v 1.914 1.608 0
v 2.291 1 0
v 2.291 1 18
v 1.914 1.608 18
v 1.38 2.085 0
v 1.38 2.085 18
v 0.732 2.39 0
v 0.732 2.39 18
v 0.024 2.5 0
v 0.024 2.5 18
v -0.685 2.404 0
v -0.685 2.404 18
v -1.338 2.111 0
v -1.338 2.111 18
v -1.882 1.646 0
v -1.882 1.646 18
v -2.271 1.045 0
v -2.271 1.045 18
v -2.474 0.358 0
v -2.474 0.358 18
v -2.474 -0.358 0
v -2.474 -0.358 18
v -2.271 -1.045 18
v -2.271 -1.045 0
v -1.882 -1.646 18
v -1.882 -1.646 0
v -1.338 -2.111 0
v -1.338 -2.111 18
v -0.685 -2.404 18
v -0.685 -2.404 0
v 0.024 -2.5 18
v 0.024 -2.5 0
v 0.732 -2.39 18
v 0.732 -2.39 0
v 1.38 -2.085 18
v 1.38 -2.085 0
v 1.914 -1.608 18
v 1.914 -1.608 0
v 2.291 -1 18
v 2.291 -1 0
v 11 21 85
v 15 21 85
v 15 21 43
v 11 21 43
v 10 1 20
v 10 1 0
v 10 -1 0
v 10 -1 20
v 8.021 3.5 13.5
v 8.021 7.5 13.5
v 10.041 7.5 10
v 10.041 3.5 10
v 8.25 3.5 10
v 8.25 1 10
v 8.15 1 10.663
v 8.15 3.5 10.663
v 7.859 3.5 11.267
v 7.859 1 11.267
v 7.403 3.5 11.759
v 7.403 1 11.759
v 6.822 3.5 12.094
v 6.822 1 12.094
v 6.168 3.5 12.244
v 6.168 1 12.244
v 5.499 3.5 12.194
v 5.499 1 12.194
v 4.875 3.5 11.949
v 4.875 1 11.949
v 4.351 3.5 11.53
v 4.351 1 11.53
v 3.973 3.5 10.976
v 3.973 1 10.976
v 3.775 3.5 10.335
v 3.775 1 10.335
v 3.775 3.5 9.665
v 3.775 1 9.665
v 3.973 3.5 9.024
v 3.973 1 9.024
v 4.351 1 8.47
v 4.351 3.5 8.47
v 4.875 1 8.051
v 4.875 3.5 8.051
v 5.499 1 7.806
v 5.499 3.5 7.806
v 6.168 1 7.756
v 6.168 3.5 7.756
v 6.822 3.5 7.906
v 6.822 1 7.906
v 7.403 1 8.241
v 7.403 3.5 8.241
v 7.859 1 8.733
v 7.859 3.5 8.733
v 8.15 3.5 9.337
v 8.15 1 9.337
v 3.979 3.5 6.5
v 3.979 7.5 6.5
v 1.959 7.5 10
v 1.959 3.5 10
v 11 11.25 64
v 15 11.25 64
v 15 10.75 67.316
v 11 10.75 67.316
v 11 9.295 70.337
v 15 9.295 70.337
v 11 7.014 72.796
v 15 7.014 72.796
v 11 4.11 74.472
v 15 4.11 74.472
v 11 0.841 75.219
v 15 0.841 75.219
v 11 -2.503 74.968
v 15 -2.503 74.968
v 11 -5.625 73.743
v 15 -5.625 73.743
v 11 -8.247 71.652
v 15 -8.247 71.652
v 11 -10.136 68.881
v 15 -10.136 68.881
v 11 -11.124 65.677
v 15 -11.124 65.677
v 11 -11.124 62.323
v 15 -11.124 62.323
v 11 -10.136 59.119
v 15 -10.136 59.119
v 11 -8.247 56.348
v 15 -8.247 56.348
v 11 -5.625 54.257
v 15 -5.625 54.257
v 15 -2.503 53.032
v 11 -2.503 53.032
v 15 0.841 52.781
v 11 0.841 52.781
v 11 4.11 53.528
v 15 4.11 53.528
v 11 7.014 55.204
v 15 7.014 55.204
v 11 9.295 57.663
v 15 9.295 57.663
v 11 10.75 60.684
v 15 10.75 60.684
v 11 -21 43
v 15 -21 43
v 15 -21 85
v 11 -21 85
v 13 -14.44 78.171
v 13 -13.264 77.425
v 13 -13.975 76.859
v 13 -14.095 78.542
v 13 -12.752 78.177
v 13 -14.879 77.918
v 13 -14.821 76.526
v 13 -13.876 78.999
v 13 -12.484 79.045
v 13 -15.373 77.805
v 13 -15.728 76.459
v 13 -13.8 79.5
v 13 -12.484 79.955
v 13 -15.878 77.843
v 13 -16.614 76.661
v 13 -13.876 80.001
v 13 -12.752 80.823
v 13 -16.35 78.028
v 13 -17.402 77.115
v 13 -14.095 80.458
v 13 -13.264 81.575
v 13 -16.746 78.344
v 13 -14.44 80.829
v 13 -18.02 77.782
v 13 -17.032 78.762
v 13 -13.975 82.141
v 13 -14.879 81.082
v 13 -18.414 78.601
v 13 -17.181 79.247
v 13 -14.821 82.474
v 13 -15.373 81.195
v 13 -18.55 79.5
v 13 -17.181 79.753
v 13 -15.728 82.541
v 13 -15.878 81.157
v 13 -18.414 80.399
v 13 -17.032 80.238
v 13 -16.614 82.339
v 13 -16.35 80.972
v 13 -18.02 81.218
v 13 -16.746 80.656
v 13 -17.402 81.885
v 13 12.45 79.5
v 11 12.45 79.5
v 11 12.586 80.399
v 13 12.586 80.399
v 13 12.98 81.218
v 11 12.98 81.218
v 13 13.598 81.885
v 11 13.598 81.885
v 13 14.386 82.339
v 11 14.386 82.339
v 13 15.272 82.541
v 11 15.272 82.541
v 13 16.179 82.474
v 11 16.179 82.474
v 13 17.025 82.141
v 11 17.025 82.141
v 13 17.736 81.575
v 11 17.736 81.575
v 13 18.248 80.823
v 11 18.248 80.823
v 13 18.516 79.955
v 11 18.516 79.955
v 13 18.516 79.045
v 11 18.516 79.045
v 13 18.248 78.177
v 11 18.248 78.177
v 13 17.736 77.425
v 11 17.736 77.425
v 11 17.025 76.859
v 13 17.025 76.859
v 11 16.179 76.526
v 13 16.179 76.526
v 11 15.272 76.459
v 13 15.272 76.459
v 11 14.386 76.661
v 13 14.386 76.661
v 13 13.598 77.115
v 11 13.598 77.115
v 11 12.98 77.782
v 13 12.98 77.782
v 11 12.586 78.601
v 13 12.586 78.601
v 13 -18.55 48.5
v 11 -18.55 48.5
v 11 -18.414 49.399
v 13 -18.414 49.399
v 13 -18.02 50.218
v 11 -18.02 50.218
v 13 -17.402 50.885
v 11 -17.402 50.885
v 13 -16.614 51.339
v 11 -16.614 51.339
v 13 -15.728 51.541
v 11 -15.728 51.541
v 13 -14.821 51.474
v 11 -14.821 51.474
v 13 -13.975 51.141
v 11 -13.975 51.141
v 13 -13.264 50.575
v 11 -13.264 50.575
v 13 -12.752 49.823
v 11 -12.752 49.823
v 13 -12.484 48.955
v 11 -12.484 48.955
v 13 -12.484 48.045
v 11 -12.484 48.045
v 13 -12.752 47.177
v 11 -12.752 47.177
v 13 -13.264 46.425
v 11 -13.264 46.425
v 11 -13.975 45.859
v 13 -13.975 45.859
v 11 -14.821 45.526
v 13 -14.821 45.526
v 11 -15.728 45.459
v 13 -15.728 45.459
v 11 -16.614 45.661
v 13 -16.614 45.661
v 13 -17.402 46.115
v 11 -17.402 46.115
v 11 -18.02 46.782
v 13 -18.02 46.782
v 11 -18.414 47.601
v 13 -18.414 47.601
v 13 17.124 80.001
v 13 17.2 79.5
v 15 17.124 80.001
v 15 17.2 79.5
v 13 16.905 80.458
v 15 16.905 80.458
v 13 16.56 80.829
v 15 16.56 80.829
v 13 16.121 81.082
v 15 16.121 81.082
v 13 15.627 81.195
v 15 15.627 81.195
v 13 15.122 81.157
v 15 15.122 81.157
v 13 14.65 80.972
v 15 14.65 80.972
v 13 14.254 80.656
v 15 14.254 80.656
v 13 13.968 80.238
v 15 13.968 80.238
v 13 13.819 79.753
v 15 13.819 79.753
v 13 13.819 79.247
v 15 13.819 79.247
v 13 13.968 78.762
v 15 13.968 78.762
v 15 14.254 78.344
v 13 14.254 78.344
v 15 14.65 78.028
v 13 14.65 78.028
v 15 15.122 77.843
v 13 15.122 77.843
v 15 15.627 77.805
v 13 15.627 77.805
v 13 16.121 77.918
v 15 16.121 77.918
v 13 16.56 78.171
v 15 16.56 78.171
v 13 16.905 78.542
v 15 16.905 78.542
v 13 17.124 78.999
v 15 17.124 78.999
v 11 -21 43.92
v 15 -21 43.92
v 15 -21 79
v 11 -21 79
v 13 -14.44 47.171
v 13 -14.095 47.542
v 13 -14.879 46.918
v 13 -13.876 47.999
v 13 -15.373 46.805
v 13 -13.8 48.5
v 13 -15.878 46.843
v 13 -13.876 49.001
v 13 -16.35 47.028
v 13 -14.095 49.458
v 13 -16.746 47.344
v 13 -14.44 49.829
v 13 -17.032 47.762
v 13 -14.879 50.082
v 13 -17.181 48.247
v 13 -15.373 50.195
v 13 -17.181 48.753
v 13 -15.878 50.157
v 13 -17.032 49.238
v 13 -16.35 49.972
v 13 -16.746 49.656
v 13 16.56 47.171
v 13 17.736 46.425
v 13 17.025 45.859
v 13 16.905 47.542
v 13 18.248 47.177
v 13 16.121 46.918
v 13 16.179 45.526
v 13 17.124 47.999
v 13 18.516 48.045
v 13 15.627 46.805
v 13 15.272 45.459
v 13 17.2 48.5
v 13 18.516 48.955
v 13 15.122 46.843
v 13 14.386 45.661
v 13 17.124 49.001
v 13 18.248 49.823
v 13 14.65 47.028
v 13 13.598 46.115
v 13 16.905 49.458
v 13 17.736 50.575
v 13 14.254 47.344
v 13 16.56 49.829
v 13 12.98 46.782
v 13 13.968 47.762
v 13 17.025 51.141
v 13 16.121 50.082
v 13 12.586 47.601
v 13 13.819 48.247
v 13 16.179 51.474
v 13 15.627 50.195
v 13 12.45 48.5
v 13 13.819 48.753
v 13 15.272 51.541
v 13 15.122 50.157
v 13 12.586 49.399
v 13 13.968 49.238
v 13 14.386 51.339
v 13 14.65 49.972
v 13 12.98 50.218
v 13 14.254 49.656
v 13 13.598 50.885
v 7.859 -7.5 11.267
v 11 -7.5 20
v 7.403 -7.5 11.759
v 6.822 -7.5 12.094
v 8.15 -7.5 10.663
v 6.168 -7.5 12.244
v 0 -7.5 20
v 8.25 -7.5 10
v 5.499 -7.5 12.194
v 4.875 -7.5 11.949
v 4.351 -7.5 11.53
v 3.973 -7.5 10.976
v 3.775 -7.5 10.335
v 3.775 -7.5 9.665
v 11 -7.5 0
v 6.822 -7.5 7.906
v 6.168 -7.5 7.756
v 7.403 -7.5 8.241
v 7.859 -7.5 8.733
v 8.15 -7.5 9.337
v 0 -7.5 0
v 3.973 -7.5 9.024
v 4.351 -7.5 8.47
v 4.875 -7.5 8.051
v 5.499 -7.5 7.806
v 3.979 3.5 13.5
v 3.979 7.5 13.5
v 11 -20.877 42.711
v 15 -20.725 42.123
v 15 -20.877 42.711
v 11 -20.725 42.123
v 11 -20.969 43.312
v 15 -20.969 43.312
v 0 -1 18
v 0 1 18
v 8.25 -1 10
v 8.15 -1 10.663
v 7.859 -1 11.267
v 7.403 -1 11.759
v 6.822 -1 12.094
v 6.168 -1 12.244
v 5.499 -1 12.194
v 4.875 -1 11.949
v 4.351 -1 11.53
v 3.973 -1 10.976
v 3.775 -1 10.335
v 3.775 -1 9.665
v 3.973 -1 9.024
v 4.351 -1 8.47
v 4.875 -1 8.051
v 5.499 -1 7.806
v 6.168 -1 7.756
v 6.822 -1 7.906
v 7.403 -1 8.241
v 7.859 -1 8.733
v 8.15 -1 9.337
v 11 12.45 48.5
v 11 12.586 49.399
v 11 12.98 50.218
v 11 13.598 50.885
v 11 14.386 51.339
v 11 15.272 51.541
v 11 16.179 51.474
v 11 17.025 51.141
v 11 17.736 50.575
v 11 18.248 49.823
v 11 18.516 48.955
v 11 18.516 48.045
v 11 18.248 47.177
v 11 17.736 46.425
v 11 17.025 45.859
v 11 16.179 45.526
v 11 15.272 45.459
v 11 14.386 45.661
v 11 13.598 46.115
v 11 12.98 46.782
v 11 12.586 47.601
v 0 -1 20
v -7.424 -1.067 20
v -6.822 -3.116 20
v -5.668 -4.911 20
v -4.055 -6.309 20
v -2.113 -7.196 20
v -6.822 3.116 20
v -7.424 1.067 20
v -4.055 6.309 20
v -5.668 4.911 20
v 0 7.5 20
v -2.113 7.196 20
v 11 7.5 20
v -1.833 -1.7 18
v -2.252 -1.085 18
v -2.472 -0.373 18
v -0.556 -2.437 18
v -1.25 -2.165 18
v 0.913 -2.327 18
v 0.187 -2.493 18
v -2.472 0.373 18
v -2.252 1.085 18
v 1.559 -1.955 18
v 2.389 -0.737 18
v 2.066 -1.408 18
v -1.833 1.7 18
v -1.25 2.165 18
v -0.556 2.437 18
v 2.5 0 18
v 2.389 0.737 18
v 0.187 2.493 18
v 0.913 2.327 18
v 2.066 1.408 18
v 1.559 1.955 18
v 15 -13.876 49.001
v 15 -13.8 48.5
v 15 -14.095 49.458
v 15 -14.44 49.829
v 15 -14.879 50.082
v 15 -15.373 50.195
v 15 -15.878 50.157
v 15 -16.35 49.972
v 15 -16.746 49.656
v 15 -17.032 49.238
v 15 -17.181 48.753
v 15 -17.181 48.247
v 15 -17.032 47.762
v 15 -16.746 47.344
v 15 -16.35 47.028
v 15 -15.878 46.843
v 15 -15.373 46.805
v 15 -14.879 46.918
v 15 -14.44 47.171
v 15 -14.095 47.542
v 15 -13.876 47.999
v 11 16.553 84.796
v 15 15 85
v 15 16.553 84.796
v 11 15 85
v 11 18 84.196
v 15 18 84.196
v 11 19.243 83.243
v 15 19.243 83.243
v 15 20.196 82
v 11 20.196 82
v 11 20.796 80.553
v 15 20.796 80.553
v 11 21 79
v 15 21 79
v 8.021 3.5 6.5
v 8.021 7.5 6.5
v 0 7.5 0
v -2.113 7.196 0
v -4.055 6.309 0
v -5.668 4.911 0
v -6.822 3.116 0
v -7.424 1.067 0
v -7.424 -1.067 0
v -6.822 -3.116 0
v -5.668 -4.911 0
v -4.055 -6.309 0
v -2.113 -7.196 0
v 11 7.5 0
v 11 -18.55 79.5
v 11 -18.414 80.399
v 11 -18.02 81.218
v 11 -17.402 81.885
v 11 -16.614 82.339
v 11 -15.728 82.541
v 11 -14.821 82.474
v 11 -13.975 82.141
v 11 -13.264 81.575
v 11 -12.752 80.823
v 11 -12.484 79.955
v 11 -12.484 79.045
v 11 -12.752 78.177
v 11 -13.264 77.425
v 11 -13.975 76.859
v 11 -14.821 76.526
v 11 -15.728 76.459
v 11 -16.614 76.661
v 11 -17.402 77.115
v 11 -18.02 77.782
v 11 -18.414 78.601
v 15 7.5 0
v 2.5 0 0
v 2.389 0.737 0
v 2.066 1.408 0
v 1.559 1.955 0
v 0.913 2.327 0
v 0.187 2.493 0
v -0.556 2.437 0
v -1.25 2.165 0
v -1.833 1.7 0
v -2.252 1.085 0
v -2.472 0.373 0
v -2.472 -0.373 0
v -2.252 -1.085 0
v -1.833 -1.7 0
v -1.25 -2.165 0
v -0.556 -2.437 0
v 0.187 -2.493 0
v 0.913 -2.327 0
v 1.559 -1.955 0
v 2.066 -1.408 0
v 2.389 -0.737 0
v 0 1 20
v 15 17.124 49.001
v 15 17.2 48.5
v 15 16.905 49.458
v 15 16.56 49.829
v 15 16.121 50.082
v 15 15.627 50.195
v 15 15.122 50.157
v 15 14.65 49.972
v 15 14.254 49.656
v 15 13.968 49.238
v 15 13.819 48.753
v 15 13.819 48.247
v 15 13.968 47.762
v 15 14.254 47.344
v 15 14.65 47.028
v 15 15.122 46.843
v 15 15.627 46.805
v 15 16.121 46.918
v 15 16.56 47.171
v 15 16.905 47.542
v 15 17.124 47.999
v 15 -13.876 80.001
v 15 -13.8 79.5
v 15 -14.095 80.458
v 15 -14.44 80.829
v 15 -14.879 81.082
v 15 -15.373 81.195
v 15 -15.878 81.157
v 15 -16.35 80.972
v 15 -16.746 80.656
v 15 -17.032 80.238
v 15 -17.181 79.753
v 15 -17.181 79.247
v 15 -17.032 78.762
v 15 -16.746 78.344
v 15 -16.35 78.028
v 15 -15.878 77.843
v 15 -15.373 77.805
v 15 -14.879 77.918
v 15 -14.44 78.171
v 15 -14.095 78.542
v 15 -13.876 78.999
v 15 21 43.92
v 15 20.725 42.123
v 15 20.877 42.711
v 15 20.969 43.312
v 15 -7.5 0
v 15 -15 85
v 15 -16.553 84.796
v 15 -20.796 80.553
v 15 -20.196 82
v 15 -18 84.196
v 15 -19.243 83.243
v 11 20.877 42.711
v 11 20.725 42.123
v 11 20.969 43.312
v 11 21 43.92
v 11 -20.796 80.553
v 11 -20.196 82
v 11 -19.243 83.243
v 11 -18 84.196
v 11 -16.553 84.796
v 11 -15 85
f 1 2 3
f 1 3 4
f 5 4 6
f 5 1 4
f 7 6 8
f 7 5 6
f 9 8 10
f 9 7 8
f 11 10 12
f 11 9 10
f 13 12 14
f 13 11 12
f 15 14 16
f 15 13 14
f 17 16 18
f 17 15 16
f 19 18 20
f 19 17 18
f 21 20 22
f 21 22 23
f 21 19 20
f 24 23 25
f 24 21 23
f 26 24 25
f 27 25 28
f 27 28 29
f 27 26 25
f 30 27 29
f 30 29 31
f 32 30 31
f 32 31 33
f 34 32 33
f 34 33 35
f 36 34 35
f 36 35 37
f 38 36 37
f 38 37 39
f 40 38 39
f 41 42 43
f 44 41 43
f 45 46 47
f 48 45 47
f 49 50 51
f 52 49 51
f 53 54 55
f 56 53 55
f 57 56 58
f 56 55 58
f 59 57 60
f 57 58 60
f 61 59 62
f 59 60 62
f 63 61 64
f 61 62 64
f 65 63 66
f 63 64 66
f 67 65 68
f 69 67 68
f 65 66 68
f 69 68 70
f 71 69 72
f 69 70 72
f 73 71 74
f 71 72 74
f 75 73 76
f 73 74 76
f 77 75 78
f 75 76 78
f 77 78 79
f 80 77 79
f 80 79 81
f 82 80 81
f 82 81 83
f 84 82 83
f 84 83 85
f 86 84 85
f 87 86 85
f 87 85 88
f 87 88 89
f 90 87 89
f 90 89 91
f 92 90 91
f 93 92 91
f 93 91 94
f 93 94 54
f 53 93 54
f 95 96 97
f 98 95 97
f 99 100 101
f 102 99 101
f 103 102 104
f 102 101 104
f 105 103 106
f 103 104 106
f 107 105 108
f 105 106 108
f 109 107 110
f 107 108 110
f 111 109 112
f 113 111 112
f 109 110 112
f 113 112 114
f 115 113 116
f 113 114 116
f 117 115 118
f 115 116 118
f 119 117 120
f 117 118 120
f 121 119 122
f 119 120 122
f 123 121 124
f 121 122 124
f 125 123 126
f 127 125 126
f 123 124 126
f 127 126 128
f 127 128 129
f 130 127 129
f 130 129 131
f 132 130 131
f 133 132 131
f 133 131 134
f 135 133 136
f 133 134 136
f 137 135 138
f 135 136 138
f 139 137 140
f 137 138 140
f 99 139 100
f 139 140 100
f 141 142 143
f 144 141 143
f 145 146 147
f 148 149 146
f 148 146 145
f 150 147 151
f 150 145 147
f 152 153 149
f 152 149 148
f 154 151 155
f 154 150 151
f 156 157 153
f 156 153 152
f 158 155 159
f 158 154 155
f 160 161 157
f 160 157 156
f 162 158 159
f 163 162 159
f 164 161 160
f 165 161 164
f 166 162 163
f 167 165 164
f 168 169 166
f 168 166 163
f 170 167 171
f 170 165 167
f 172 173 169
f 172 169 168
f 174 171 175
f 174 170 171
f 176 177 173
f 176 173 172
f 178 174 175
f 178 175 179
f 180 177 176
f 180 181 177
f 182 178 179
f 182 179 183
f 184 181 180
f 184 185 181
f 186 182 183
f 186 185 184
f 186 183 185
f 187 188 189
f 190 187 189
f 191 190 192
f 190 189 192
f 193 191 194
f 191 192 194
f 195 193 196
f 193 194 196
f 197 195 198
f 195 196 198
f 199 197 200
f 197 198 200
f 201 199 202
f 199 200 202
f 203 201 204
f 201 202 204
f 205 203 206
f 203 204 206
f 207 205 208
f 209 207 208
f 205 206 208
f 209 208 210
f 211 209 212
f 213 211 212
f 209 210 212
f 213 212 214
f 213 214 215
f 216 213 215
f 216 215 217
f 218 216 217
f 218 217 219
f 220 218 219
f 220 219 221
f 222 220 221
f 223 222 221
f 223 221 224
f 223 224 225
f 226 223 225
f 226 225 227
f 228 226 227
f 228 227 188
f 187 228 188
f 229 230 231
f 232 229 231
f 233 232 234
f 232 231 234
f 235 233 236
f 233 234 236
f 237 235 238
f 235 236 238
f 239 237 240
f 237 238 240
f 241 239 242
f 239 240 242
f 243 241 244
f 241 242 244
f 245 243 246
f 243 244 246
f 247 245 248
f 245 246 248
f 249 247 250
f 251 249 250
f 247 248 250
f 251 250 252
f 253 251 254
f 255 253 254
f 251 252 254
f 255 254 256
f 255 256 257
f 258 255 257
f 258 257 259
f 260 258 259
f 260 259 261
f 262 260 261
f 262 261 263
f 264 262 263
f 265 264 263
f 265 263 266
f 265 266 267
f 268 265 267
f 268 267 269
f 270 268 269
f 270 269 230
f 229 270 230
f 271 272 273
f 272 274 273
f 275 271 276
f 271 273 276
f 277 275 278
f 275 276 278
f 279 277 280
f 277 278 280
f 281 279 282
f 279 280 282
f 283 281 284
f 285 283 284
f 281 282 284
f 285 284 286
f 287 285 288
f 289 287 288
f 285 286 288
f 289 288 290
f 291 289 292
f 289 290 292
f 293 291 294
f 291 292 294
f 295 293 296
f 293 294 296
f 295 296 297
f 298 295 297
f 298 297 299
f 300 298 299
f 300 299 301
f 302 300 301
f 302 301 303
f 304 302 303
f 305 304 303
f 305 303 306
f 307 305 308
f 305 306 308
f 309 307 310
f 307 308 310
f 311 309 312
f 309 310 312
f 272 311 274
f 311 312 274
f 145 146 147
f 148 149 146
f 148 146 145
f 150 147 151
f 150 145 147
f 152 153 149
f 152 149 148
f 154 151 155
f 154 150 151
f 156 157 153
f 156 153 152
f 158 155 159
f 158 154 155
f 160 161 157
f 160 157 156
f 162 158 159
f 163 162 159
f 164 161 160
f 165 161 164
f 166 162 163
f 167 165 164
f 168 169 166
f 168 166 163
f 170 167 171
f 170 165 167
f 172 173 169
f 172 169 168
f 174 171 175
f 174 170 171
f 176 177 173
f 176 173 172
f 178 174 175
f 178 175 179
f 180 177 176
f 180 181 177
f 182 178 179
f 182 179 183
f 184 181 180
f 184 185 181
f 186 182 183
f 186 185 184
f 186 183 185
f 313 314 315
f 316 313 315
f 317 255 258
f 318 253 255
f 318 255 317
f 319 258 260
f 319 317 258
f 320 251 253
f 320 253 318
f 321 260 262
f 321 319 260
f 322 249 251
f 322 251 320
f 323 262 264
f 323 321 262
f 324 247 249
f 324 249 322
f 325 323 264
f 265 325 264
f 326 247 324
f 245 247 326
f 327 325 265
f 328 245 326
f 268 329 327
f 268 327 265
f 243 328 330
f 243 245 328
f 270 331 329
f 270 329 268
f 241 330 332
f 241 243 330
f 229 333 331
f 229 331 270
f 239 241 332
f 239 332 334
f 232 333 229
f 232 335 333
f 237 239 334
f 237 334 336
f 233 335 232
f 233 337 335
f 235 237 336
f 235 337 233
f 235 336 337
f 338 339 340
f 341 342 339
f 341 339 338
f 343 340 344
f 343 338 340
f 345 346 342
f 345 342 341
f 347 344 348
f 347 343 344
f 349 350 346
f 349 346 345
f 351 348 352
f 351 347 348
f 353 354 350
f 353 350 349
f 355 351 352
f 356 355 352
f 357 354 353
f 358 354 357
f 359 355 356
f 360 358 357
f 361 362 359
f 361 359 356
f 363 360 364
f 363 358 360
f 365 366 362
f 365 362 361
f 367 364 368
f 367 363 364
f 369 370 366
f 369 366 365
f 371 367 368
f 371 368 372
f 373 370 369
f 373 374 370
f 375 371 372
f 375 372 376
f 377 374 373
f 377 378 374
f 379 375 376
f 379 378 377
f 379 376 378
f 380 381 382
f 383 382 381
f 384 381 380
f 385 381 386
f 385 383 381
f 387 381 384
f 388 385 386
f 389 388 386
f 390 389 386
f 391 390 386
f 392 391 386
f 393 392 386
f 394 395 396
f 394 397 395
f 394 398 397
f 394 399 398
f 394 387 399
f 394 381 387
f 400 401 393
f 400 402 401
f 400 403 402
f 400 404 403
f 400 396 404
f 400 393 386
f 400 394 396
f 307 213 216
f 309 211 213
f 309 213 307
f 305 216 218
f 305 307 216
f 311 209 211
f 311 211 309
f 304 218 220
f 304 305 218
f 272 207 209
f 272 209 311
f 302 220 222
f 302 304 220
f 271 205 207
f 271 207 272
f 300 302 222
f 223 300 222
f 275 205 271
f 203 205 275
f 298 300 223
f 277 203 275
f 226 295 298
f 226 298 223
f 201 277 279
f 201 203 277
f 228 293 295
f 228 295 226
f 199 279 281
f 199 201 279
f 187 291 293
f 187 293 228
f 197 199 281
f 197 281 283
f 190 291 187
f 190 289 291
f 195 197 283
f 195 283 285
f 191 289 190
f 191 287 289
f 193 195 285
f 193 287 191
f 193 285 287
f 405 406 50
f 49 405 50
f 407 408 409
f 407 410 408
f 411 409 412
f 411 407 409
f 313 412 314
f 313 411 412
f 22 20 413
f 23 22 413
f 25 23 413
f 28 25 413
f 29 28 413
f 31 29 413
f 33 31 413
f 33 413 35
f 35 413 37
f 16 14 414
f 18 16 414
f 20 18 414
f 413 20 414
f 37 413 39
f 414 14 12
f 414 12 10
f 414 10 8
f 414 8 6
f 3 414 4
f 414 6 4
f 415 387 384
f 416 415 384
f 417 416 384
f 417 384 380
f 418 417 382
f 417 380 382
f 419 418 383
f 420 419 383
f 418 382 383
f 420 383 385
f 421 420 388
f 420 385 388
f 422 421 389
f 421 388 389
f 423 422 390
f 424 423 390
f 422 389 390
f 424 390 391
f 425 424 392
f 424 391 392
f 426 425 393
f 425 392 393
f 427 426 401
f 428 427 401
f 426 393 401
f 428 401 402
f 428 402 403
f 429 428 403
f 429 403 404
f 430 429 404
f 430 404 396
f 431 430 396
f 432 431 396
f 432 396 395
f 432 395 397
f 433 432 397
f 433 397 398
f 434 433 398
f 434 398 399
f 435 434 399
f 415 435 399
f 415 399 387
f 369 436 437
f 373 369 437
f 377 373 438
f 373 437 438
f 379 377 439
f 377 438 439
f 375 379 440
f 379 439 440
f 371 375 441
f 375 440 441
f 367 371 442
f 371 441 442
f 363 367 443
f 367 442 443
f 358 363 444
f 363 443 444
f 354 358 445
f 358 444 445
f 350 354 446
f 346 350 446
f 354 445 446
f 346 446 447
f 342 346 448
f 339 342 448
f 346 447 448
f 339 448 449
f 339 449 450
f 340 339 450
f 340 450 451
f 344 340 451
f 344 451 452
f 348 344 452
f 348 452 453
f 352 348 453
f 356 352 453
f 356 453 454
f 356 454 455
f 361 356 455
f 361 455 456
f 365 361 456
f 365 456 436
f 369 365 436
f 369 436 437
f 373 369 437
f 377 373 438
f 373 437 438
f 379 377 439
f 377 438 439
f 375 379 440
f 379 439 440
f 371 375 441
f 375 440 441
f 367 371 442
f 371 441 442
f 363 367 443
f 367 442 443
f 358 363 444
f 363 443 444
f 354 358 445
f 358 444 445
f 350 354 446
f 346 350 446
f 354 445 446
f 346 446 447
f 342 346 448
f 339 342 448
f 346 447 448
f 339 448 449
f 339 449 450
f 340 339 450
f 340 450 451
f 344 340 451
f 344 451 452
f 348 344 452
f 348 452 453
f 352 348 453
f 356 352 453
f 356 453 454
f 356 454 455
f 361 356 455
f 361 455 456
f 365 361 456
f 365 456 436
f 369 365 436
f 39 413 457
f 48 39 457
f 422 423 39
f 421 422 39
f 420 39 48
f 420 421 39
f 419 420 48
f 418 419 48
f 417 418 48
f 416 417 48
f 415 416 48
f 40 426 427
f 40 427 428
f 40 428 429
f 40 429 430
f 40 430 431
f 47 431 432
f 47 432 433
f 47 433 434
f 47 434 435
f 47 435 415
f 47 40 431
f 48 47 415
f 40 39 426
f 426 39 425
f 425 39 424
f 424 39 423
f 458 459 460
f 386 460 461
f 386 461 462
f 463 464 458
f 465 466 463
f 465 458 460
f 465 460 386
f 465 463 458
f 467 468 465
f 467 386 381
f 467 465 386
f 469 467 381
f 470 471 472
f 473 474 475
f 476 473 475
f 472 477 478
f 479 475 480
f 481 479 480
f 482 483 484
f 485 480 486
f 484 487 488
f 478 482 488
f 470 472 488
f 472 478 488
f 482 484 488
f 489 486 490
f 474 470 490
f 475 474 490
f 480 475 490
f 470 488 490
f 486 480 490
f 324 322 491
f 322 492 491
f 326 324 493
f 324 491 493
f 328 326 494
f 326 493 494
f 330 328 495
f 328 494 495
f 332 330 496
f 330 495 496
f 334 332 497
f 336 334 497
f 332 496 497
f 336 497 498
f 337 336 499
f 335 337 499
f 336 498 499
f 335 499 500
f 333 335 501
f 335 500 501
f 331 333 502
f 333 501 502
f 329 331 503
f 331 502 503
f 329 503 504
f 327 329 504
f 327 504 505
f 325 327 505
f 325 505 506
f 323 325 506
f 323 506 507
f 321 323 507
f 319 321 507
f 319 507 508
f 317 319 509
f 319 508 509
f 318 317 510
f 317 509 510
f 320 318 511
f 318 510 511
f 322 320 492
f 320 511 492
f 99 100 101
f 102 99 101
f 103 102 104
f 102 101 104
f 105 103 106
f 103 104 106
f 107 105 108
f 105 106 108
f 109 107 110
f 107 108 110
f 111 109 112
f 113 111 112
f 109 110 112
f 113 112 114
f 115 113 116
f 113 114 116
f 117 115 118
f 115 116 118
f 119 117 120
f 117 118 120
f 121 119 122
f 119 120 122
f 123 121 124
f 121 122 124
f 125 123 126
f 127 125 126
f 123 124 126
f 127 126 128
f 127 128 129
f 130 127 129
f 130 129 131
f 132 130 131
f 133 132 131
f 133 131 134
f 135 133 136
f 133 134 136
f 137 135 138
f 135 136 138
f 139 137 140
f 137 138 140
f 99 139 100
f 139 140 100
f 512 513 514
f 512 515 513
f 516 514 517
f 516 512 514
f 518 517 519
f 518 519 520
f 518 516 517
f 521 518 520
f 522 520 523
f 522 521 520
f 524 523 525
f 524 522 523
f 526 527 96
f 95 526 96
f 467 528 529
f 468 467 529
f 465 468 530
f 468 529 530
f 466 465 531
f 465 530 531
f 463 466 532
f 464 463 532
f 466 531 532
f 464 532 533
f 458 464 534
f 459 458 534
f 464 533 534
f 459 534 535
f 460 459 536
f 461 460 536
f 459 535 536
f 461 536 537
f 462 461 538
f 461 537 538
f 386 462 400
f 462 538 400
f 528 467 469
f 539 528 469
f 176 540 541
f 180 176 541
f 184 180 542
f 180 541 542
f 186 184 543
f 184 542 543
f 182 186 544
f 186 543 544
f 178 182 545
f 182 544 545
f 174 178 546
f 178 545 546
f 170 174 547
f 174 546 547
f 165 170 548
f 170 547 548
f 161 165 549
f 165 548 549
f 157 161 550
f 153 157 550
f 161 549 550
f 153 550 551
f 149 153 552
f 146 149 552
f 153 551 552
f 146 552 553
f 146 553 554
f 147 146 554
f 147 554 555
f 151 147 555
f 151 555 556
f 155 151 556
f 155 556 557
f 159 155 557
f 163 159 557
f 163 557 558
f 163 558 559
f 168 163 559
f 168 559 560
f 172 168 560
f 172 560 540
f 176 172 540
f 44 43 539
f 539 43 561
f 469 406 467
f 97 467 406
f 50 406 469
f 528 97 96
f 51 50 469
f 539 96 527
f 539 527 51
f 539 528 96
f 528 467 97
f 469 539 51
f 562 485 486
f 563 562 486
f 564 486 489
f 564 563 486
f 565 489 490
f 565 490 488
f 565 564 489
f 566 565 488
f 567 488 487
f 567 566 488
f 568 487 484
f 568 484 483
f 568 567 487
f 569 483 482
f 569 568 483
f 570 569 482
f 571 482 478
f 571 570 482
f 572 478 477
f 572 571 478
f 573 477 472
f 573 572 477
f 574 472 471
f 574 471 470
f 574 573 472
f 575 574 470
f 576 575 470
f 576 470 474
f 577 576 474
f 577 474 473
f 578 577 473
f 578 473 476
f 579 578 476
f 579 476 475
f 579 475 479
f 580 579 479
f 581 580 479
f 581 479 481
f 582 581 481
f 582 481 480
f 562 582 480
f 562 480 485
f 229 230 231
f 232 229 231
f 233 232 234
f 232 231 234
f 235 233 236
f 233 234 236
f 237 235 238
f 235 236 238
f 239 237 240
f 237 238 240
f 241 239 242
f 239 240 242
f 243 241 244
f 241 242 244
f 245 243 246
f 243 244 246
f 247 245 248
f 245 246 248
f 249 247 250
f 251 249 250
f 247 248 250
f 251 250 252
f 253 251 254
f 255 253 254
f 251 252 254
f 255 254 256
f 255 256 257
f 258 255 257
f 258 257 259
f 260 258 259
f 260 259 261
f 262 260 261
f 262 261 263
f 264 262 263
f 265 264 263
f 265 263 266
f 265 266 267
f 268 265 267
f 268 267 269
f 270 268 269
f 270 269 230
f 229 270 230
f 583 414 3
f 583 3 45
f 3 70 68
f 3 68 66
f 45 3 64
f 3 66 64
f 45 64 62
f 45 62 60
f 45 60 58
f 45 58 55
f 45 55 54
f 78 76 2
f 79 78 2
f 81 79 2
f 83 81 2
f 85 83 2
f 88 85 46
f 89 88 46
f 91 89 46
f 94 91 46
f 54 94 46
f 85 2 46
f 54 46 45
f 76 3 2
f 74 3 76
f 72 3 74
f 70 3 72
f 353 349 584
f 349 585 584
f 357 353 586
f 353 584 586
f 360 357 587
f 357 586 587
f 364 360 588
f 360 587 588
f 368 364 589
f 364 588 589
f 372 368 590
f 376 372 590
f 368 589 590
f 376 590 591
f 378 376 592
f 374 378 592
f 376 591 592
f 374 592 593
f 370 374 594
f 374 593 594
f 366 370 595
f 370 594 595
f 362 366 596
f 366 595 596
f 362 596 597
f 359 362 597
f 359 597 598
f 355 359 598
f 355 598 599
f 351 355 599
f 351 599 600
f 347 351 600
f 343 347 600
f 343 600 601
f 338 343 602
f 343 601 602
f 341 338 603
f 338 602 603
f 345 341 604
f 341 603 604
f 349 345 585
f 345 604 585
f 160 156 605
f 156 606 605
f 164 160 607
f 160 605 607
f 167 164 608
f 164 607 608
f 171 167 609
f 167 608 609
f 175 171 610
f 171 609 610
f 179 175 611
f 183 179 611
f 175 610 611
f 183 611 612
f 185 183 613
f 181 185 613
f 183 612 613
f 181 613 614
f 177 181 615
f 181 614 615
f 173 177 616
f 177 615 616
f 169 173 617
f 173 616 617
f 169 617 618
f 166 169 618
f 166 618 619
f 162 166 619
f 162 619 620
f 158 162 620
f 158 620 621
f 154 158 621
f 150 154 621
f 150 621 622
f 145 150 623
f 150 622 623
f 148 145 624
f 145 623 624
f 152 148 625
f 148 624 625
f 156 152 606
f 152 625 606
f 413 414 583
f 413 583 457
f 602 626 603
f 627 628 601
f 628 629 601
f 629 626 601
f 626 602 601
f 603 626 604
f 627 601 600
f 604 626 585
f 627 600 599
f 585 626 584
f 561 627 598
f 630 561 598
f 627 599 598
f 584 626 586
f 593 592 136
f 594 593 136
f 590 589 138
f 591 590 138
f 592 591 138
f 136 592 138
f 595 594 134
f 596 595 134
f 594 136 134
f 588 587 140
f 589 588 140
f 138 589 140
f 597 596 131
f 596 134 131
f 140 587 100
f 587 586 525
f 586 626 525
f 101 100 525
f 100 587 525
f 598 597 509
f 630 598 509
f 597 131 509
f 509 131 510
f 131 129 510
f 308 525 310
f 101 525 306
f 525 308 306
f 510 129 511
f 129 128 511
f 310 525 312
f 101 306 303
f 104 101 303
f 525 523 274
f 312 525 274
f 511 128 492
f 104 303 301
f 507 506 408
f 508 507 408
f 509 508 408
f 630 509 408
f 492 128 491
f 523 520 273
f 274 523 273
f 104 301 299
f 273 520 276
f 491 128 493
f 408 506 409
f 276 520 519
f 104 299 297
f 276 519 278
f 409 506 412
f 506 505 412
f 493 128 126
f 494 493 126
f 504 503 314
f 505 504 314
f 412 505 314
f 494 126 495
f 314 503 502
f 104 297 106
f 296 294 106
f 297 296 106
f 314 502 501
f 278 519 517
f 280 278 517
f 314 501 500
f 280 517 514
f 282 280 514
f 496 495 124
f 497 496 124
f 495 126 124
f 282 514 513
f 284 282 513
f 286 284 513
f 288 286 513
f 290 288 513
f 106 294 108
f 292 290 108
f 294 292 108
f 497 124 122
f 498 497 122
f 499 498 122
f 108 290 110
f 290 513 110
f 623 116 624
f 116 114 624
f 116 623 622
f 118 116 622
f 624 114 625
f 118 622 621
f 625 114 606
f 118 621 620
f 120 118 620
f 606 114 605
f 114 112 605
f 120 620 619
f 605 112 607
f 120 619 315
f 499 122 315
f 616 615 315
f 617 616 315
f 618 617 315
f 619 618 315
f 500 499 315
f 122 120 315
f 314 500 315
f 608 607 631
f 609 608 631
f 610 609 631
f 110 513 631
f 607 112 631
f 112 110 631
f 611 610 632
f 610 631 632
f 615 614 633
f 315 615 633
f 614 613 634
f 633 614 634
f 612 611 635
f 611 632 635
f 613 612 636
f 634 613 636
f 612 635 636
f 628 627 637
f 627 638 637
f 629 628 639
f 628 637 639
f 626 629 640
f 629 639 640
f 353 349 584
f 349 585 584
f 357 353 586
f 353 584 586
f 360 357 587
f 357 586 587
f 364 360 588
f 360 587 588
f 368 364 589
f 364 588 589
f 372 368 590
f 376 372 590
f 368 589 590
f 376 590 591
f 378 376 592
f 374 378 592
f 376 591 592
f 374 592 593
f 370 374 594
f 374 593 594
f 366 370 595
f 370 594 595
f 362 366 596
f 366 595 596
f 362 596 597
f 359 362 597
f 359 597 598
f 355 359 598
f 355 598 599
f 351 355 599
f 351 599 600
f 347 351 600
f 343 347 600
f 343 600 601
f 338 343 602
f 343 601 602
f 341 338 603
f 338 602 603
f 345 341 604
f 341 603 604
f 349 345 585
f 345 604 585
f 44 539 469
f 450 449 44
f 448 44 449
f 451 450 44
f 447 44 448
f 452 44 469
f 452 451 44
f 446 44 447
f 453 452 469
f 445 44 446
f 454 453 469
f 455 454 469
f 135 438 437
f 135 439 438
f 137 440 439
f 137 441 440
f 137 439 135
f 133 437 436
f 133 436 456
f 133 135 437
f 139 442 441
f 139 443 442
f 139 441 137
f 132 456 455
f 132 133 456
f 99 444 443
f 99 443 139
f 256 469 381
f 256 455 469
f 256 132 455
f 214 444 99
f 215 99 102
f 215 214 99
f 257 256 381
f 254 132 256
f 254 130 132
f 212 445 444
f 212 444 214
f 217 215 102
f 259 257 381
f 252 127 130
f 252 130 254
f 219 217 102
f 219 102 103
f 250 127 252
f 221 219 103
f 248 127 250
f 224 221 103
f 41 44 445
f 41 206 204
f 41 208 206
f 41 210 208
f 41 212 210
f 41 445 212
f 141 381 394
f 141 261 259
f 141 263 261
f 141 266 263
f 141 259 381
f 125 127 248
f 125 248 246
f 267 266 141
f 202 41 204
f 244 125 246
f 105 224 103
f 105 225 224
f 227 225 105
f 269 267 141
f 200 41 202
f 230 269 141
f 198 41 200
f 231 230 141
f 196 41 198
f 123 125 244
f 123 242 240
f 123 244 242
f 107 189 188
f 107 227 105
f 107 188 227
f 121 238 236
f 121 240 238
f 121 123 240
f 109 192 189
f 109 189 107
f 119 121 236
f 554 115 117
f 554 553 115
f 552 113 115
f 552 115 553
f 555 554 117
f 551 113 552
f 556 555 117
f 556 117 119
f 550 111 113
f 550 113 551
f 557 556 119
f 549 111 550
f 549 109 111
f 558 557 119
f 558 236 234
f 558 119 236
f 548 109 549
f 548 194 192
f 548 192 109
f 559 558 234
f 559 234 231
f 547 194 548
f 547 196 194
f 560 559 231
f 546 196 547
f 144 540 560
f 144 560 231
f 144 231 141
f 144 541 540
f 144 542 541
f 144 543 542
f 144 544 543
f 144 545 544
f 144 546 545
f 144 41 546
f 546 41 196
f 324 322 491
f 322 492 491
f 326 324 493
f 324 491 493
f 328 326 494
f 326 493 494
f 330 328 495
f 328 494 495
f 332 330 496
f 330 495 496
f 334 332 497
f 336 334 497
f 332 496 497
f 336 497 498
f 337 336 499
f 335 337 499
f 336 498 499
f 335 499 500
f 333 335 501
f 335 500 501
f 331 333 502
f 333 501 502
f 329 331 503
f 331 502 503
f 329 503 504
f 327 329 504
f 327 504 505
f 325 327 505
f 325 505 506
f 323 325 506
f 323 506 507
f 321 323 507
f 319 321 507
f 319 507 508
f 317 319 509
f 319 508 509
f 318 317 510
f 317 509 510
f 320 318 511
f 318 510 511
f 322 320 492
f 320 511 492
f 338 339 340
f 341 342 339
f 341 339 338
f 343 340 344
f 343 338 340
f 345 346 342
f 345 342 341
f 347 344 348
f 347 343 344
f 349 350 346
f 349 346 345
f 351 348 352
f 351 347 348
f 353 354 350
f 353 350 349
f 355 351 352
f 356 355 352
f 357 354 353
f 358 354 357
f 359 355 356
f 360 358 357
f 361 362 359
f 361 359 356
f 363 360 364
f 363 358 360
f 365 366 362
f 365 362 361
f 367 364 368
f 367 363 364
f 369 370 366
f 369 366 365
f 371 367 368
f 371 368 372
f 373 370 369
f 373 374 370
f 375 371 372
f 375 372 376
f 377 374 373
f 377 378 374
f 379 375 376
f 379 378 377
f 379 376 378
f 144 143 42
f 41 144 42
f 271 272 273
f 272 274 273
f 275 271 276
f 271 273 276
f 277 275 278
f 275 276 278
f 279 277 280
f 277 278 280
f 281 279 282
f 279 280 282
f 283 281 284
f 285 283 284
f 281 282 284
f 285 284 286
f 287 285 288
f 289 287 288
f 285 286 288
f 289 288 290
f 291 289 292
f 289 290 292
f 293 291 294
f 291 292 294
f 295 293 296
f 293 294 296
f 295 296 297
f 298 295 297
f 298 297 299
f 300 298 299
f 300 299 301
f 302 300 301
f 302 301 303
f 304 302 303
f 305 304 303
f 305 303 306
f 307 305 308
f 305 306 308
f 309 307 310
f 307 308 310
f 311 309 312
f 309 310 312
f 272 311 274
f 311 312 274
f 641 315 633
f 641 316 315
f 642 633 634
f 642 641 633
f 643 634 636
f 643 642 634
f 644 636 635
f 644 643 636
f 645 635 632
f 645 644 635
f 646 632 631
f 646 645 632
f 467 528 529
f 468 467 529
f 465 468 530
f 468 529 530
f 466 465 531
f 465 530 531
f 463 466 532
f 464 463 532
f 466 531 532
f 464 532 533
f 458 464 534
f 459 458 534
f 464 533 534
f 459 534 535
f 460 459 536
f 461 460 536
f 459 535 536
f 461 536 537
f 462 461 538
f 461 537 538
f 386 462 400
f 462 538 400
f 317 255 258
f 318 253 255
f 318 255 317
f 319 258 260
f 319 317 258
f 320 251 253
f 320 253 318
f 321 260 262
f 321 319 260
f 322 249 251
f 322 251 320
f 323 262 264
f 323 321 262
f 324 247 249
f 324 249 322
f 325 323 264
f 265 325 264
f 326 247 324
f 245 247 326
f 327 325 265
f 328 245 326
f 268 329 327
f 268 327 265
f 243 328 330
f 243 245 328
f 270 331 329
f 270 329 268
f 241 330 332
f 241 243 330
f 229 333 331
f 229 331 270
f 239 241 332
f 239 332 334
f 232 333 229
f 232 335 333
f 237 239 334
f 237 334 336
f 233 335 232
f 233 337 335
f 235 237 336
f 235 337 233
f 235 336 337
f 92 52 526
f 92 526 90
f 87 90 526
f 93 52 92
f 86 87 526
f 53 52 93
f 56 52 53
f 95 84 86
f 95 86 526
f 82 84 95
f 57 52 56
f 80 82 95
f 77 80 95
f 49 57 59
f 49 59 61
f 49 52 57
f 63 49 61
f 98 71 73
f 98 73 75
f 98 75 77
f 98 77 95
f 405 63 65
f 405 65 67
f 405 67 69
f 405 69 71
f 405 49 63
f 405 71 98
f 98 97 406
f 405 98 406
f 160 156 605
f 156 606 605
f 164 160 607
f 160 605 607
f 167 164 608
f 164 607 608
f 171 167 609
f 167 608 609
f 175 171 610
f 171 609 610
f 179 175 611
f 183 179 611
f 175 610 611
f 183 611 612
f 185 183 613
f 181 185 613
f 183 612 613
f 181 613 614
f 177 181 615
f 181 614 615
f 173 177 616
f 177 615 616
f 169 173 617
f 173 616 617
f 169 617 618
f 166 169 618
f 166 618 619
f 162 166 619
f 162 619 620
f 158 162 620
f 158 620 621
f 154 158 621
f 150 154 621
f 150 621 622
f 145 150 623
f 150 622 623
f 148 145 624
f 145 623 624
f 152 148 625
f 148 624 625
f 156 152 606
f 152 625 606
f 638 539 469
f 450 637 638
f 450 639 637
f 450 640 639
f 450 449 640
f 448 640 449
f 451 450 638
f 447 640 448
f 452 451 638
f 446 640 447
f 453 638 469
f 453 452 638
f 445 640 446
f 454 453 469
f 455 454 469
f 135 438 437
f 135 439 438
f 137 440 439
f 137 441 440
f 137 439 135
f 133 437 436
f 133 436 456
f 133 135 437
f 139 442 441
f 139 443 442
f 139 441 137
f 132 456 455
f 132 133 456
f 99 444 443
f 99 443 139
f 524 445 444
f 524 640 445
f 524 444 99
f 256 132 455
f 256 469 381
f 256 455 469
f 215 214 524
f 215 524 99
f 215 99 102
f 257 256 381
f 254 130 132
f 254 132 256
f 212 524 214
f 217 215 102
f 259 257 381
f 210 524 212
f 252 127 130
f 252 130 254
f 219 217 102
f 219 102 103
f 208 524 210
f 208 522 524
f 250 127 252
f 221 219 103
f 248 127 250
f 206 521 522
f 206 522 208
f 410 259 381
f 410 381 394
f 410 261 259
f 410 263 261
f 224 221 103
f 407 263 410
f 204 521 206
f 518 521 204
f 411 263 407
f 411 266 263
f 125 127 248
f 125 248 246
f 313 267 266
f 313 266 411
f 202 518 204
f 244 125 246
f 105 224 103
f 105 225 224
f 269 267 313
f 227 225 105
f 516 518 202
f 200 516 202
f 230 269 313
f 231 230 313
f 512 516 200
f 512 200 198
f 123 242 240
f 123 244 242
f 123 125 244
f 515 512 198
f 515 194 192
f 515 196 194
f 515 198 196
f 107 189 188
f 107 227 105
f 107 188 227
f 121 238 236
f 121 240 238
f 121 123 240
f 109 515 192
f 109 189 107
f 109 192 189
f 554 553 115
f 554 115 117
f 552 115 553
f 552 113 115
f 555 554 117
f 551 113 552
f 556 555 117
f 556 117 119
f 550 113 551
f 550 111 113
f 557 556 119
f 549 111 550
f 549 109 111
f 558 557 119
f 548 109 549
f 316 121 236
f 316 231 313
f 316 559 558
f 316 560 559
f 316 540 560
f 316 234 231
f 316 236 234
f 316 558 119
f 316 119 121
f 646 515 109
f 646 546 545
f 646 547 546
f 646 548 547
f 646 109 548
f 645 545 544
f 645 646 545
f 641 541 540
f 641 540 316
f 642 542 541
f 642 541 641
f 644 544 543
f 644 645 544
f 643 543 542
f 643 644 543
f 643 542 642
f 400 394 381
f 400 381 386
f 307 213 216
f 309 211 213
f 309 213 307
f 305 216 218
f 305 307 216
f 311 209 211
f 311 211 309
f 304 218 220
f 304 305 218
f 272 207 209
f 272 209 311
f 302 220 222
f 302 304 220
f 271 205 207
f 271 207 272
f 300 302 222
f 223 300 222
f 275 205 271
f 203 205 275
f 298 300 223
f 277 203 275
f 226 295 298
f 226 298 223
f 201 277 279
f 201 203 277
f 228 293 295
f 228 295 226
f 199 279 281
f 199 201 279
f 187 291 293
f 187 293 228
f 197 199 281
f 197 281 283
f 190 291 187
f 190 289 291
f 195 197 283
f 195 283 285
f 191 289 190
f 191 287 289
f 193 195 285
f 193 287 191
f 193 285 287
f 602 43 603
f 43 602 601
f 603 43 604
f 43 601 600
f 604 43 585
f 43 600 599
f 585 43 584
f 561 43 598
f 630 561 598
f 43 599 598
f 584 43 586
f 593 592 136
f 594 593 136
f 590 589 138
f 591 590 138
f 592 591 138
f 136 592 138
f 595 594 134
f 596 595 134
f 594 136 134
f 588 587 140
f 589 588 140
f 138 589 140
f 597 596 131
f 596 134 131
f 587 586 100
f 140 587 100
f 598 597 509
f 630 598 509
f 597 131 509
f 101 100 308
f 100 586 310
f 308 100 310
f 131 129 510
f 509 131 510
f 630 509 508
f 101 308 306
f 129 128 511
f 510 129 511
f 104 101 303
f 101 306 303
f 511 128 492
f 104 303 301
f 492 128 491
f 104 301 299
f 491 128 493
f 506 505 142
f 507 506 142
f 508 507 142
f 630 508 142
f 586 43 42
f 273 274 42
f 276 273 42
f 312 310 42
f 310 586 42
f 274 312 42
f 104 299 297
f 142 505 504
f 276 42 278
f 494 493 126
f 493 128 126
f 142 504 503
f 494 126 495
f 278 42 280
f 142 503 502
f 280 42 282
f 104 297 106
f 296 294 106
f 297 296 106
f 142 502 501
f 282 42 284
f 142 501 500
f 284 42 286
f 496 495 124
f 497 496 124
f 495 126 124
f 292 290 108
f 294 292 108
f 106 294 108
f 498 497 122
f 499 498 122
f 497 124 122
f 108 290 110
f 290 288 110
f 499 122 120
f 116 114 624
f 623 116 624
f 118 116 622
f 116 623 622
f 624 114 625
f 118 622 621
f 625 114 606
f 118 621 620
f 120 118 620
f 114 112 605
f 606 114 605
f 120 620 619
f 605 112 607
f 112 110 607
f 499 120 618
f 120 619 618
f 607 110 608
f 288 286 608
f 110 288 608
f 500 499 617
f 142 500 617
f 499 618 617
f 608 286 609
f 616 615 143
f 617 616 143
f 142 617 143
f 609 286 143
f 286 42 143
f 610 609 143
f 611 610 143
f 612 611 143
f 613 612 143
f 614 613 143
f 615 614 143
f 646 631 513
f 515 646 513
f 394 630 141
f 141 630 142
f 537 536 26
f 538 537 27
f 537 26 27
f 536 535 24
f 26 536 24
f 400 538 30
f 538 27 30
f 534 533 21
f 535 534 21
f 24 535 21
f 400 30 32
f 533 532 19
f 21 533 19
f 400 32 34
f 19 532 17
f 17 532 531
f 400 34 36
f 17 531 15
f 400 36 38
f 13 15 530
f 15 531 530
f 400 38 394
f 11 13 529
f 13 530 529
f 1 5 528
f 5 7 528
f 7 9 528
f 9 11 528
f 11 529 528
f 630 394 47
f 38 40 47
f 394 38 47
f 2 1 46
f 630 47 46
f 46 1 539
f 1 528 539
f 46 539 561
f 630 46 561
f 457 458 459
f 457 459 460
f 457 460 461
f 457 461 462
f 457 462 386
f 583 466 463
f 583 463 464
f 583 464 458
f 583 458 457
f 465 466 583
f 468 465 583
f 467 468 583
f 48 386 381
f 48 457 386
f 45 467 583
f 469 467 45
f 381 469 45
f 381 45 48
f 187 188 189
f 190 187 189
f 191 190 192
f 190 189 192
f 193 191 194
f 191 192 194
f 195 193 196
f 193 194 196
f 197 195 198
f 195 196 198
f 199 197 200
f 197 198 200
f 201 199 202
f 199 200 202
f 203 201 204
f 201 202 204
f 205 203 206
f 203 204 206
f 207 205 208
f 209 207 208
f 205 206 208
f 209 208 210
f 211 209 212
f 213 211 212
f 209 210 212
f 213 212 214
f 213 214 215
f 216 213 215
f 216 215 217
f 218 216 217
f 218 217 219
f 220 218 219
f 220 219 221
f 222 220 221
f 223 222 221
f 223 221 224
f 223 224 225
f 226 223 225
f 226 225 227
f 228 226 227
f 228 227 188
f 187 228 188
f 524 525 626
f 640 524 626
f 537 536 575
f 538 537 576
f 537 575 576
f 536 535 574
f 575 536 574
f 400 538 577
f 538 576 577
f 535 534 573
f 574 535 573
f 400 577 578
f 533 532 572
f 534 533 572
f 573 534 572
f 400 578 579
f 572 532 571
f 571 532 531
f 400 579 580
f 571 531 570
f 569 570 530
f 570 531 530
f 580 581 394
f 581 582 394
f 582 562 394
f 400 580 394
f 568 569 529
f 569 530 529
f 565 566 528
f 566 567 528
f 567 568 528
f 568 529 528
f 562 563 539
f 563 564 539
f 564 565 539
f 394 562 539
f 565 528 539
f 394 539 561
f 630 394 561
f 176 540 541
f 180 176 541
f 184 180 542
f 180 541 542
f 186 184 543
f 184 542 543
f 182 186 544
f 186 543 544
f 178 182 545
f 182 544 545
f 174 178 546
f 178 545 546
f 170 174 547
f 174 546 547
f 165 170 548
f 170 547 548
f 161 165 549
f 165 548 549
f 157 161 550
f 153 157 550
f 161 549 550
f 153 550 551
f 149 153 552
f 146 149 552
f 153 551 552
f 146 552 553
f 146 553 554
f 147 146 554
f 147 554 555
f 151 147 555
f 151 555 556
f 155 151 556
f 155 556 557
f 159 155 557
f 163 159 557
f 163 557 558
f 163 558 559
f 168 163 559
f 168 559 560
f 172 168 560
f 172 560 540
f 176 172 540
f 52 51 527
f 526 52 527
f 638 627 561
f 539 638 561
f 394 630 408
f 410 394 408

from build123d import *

# Parameters (mm, degrees)
SKETCH_R            = 2.5
PAD_DEPTH           = 20
SKETCH001_R         = 11.25
PAD001_DEPTH        = 4
HOLE_D              = 3.4
HOLE_DEPTH          = 25
HOLE_CBORE_D        = 6.1
HOLE_CBORE_DEPTH    = 2
SKETCH004_R         = 2.5
PAD002_DEPTH        = 2
SKETCH008_R         = 2.5
PAD003_DEPTH        = 20
SKETCH009_R         = 11.25
PAD004_DEPTH        = 4
HOLE002_D           = 3.4
HOLE002_DEPTH       = 25
HOLE002_CBORE_D     = 6.1
HOLE002_CBORE_DEPTH = 2
SKETCH011_R         = 2.5
PAD005_DEPTH        = 2
SKETCH012_W         = 10
SKETCH012_H         = 2
POCKET002_DEPTH     = 85.001
SKETCH013_R         = 2.25
HOLE003_DEPTH       = 25
HOLE003_TIPS_R      = 2.25
POCKET003_DEPTH     = 4
FILLET_R            = 6


with BuildPart() as arm0_skel:
    # Sketch → Pad (new body)
    with BuildSketch(Plane.XY):
        with BuildLine():
            ThreePointArc((0, 7.5), (-7.5, 0), (0, -7.5))
            Line((15, -7.5), (0, -7.5))
            Line((15, 7.5), (15, -7.5))
            Line((0, 7.5), (15, 7.5))
        make_face()
        Circle(SKETCH_R, mode=Mode.SUBTRACT)
    extrude(amount=PAD_DEPTH)

    # Sketch001 (on Face3 of Pad) → Pad001 (join)
    with BuildSketch(Plane.YZ.offset(15)):
        Polygon((-7.5, 0), (-21, 43), (-21, 85), (21, 85), (21, 43), (7.5, 0), align=None)
        with Locations((0, 64)):
            Circle(SKETCH001_R, mode=Mode.SUBTRACT)
    extrude(amount=-PAD001_DEPTH)

    # Hole
    with Locations(Plane(origin=(11, 0, 0), x_dir=(0, -1, 0), z_dir=(-1, 0, 0))):
        with Locations((15.5, 79.5), (-15.5, 79.5), (15.5, 48.5), (-15.5, 48.5)):
            CounterBoreHole(HOLE_D / 2, HOLE_CBORE_D / 2, HOLE_CBORE_DEPTH, depth=HOLE_DEPTH)

    # Sketch004 (on Face5 of Hole) → Pad002 (join)
    with BuildSketch(Plane.XY.offset(20)):
        Circle(SKETCH004_R)
    extrude(amount=-PAD002_DEPTH)


with BuildPart() as arm0s:
    # Sketch008 → Pad003 (new body)
    with BuildSketch(Plane.XY):
        with BuildLine():
            ThreePointArc((0, 7.5), (-7.5, 0), (0, -7.5))
            Line((15, -7.5), (0, -7.5))
            Line((15, 7.5), (15, -7.5))
            Line((0, 7.5), (15, 7.5))
        make_face()
        Circle(SKETCH008_R, mode=Mode.SUBTRACT)
    extrude(amount=PAD003_DEPTH)

    # Sketch009 (on Face3 of Pad003) → Pad004 (join)
    with BuildSketch(Plane.YZ.offset(15)):
        Polygon((-7.5, 0), (-21, 43), (-21, 85), (21, 85), (21, 43), (7.5, 0), align=None)
        with Locations((0, 64)):
            Circle(SKETCH009_R, mode=Mode.SUBTRACT)
    extrude(amount=-PAD004_DEPTH)

    # Hole002
    with Locations(Plane(origin=(11, 0, 0), x_dir=(0, -1, 0), z_dir=(-1, 0, 0))):
        with Locations((15.5, 79.5), (-15.5, 79.5), (15.5, 48.5), (-15.5, 48.5)):
            CounterBoreHole(HOLE002_D / 2, HOLE002_CBORE_D / 2, HOLE002_CBORE_DEPTH, depth=HOLE002_DEPTH)

    # Sketch011 (on Face5 of Hole002) → Pad005 (join)
    with BuildSketch(Plane.XY.offset(20)):
        Circle(SKETCH011_R)
    extrude(amount=-PAD005_DEPTH)

    # Sketch012 (on Face4 of Pad005) → Pocket002 (cut, through all)
    with BuildSketch(Plane(origin=(0, 0, 0), x_dir=(1, 0, 0), z_dir=(0, 0, -1))):
        with Locations((5, 0)):
            Rectangle(SKETCH012_W, SKETCH012_H)
    extrude(amount=-POCKET002_DEPTH, mode=Mode.SUBTRACT)

    # Sketch013 (on Face3 of Pocket002) → Hole003 (cut)
    with BuildSketch(Plane.XZ.offset(7.5)):
        with Locations((6, 10)):
            Circle(SKETCH013_R)
    extrude(amount=-HOLE003_DEPTH, mode=Mode.SUBTRACT)

    # Hole003 tips → Hole003 tip 1 section 0
    with BuildSketch(Plane.XZ.offset(-17.5), mode=Mode.PRIVATE) as hole003_tip_1_s0:
        with Locations((6, 10)):
            Circle(HOLE003_TIPS_R)
    loft([hole003_tip_1_s0.sketch, Vertex(6, 18.851936, 10)], mode=Mode.SUBTRACT)

    # Sketch014 (on Face2 of Hole003) → Pocket003 (cut)
    with BuildSketch(Plane(origin=(0, 7.5, 0), x_dir=(-1, 0, 0), z_dir=(0, 1, 0))):
        Polygon((-1.958548, 10), (-3.979274, 13.5), (-8.020726, 13.5), (-10.041452, 10), (-8.020726, 6.5), (-3.979274, 6.5), align=None)
    extrude(amount=-POCKET003_DEPTH, mode=Mode.SUBTRACT)

    # Fillet
    fillet_edges = [arm0s.edges().sort_by_distance(p)[0] for p in [
        (13, -21, 85),
        (13, 21, 85),
        (13, -21, 43),
        (13, 21, 43),
    ]]
    fillet(fillet_edges, radius=FILLET_R)


solid = Compound([arm0_skel.part, arm0s.part])
